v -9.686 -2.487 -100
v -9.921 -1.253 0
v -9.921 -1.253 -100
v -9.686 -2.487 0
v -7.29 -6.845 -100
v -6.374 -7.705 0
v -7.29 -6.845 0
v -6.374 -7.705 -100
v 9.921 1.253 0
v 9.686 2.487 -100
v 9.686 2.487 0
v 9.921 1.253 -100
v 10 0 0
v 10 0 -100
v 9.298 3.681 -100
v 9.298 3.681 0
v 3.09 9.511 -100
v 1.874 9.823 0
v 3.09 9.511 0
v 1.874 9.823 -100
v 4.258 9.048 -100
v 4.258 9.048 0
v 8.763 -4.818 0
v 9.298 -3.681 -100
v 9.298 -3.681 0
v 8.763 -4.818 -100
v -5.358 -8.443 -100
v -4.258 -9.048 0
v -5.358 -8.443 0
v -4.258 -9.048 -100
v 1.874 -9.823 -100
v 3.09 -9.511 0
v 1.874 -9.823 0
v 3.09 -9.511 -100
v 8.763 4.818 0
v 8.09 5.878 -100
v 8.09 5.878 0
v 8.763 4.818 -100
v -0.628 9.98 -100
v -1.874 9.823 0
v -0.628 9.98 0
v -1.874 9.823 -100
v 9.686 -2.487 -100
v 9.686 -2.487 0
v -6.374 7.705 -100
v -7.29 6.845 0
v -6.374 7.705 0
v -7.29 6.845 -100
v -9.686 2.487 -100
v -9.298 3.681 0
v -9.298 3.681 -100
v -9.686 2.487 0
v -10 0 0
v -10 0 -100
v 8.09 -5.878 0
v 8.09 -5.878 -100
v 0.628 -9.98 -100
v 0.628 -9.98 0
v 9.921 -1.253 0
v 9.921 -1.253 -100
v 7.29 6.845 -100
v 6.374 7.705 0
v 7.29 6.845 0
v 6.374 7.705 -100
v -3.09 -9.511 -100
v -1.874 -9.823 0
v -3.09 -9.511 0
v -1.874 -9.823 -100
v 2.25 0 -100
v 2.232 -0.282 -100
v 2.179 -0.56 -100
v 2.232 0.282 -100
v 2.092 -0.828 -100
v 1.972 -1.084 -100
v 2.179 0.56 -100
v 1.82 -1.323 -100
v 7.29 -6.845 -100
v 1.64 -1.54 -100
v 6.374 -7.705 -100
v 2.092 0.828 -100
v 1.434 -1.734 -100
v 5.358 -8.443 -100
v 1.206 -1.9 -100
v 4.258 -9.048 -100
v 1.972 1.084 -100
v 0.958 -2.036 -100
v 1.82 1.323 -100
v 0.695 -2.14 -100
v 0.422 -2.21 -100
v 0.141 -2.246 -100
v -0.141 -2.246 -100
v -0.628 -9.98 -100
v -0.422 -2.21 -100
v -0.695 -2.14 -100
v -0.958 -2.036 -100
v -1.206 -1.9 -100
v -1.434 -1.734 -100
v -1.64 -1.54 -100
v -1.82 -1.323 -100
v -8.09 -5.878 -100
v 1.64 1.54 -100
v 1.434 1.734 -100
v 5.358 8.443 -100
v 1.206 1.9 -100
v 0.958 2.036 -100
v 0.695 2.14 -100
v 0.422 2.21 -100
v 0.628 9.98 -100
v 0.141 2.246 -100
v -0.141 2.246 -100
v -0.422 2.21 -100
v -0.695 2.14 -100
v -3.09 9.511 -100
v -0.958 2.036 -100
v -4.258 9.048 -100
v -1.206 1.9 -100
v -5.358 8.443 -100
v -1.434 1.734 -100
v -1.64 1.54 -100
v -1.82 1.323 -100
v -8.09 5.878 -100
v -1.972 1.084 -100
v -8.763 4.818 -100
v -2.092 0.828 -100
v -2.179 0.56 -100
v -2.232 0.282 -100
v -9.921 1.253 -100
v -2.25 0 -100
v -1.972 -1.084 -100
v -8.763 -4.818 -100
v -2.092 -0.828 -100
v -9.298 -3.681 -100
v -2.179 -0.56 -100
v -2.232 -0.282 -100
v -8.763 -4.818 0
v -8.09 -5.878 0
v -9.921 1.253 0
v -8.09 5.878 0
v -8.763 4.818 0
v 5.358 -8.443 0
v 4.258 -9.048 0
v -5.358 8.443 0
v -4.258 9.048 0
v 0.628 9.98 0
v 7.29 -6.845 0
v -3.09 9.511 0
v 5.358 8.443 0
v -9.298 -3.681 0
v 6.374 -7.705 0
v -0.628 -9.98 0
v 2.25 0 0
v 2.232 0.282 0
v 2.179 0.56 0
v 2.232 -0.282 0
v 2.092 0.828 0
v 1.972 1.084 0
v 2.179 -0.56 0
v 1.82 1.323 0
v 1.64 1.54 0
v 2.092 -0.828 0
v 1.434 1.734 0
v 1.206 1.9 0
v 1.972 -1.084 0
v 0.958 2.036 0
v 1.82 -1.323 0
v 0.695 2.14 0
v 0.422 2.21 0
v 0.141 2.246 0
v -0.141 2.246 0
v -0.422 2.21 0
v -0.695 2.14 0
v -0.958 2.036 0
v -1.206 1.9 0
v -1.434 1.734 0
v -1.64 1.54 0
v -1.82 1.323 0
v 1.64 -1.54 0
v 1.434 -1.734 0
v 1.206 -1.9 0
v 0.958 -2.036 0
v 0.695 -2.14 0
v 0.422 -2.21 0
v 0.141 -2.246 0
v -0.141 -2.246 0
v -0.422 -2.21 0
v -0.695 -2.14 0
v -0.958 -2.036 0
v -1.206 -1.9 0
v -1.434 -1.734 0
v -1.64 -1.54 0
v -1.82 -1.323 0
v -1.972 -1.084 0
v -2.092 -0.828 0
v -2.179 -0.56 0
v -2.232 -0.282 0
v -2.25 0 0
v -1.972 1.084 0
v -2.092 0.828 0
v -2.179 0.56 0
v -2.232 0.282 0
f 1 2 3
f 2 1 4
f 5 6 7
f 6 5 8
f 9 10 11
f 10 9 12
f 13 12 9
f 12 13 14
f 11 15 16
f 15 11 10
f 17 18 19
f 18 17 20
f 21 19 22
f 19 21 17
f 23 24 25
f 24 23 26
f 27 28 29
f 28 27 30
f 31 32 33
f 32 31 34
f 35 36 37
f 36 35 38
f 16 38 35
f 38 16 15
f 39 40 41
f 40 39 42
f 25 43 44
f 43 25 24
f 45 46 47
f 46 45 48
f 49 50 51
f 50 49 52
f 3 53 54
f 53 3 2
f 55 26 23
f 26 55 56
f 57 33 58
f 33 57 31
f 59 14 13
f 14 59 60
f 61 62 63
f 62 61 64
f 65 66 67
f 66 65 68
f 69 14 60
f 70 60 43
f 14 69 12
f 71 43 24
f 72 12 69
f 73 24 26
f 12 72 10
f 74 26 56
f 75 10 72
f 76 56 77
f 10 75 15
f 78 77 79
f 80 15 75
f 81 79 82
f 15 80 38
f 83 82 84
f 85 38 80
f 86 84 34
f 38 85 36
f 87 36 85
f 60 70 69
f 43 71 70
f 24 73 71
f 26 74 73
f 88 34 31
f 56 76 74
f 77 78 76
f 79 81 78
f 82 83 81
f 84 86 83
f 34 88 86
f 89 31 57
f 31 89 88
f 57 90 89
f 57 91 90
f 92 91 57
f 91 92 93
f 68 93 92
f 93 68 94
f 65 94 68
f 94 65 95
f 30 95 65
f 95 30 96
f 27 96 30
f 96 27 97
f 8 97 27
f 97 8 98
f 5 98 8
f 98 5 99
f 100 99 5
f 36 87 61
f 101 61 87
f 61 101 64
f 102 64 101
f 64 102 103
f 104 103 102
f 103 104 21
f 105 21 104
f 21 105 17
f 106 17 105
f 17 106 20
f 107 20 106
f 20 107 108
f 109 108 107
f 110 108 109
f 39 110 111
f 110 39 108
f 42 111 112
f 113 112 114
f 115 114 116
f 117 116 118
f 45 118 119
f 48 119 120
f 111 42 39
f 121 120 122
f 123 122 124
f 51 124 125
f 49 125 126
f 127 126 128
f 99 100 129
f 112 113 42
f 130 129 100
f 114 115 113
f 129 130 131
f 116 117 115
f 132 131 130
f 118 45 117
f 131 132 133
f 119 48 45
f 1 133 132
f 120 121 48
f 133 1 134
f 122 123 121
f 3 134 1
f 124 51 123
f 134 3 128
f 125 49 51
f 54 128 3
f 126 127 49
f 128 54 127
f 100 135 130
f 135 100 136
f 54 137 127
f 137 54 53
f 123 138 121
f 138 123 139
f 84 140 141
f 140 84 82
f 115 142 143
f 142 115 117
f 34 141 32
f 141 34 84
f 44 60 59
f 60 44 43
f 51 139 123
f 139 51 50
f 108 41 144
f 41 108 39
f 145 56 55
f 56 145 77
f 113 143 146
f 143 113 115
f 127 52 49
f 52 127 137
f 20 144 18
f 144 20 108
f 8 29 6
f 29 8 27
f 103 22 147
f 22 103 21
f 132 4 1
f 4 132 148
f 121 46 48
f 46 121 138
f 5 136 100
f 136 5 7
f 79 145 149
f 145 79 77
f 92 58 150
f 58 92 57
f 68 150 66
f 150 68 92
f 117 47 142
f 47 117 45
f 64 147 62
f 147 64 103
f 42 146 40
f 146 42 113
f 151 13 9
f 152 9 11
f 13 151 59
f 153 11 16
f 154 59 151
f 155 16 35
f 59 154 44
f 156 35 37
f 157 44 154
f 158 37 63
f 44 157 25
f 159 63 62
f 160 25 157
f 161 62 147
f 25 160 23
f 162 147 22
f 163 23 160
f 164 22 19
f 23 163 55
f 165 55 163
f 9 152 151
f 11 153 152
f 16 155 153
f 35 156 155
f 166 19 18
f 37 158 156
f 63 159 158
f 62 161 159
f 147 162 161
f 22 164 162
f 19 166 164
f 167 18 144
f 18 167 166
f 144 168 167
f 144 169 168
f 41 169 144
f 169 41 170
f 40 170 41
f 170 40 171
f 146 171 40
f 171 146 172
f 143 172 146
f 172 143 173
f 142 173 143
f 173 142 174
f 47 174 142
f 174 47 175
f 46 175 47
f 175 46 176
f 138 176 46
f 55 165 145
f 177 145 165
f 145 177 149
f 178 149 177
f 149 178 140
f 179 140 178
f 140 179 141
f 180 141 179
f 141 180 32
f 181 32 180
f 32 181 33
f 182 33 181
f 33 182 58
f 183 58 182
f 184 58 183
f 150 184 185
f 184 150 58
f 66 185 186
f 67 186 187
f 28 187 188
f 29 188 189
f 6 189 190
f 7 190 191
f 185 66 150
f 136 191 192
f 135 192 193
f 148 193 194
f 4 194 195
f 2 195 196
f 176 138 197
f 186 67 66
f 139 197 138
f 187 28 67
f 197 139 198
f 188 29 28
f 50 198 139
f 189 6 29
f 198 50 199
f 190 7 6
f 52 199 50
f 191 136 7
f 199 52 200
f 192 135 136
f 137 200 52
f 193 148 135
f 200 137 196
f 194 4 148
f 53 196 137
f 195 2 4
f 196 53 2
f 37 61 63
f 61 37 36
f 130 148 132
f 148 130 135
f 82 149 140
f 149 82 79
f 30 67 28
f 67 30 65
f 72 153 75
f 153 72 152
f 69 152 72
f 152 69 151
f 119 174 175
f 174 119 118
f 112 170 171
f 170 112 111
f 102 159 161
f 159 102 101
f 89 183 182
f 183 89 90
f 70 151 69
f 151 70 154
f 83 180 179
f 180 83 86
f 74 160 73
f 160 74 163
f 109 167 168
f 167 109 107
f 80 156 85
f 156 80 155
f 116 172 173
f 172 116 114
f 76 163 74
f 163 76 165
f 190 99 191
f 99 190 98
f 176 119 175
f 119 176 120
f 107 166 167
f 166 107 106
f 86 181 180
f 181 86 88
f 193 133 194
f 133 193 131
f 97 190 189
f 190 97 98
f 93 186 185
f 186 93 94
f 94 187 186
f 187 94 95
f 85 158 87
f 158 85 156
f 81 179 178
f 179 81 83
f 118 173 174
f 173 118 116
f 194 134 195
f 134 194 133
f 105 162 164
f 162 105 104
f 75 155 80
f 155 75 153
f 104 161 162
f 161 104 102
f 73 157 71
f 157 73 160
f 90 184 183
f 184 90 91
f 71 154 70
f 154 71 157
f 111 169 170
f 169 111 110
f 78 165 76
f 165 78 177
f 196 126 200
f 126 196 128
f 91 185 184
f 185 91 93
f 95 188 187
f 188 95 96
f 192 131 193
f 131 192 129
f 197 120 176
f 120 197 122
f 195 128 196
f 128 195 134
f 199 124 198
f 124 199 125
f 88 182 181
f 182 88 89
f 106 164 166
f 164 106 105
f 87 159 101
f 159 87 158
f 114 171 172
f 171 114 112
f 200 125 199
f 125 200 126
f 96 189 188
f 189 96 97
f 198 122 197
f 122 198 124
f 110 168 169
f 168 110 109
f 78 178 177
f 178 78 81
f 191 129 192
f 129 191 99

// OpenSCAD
$fn = 50;


difference() {
	union() {
		translate(v = [0, 0, -100.0000000000]) {
			cylinder(h = 100, r = 10.0000000000);
		}
	}
	union() {
		#translate(v = [0, 0, -100]) {
			cylinder(h = 100, r = 2.2500000000);
		}
	}
}
